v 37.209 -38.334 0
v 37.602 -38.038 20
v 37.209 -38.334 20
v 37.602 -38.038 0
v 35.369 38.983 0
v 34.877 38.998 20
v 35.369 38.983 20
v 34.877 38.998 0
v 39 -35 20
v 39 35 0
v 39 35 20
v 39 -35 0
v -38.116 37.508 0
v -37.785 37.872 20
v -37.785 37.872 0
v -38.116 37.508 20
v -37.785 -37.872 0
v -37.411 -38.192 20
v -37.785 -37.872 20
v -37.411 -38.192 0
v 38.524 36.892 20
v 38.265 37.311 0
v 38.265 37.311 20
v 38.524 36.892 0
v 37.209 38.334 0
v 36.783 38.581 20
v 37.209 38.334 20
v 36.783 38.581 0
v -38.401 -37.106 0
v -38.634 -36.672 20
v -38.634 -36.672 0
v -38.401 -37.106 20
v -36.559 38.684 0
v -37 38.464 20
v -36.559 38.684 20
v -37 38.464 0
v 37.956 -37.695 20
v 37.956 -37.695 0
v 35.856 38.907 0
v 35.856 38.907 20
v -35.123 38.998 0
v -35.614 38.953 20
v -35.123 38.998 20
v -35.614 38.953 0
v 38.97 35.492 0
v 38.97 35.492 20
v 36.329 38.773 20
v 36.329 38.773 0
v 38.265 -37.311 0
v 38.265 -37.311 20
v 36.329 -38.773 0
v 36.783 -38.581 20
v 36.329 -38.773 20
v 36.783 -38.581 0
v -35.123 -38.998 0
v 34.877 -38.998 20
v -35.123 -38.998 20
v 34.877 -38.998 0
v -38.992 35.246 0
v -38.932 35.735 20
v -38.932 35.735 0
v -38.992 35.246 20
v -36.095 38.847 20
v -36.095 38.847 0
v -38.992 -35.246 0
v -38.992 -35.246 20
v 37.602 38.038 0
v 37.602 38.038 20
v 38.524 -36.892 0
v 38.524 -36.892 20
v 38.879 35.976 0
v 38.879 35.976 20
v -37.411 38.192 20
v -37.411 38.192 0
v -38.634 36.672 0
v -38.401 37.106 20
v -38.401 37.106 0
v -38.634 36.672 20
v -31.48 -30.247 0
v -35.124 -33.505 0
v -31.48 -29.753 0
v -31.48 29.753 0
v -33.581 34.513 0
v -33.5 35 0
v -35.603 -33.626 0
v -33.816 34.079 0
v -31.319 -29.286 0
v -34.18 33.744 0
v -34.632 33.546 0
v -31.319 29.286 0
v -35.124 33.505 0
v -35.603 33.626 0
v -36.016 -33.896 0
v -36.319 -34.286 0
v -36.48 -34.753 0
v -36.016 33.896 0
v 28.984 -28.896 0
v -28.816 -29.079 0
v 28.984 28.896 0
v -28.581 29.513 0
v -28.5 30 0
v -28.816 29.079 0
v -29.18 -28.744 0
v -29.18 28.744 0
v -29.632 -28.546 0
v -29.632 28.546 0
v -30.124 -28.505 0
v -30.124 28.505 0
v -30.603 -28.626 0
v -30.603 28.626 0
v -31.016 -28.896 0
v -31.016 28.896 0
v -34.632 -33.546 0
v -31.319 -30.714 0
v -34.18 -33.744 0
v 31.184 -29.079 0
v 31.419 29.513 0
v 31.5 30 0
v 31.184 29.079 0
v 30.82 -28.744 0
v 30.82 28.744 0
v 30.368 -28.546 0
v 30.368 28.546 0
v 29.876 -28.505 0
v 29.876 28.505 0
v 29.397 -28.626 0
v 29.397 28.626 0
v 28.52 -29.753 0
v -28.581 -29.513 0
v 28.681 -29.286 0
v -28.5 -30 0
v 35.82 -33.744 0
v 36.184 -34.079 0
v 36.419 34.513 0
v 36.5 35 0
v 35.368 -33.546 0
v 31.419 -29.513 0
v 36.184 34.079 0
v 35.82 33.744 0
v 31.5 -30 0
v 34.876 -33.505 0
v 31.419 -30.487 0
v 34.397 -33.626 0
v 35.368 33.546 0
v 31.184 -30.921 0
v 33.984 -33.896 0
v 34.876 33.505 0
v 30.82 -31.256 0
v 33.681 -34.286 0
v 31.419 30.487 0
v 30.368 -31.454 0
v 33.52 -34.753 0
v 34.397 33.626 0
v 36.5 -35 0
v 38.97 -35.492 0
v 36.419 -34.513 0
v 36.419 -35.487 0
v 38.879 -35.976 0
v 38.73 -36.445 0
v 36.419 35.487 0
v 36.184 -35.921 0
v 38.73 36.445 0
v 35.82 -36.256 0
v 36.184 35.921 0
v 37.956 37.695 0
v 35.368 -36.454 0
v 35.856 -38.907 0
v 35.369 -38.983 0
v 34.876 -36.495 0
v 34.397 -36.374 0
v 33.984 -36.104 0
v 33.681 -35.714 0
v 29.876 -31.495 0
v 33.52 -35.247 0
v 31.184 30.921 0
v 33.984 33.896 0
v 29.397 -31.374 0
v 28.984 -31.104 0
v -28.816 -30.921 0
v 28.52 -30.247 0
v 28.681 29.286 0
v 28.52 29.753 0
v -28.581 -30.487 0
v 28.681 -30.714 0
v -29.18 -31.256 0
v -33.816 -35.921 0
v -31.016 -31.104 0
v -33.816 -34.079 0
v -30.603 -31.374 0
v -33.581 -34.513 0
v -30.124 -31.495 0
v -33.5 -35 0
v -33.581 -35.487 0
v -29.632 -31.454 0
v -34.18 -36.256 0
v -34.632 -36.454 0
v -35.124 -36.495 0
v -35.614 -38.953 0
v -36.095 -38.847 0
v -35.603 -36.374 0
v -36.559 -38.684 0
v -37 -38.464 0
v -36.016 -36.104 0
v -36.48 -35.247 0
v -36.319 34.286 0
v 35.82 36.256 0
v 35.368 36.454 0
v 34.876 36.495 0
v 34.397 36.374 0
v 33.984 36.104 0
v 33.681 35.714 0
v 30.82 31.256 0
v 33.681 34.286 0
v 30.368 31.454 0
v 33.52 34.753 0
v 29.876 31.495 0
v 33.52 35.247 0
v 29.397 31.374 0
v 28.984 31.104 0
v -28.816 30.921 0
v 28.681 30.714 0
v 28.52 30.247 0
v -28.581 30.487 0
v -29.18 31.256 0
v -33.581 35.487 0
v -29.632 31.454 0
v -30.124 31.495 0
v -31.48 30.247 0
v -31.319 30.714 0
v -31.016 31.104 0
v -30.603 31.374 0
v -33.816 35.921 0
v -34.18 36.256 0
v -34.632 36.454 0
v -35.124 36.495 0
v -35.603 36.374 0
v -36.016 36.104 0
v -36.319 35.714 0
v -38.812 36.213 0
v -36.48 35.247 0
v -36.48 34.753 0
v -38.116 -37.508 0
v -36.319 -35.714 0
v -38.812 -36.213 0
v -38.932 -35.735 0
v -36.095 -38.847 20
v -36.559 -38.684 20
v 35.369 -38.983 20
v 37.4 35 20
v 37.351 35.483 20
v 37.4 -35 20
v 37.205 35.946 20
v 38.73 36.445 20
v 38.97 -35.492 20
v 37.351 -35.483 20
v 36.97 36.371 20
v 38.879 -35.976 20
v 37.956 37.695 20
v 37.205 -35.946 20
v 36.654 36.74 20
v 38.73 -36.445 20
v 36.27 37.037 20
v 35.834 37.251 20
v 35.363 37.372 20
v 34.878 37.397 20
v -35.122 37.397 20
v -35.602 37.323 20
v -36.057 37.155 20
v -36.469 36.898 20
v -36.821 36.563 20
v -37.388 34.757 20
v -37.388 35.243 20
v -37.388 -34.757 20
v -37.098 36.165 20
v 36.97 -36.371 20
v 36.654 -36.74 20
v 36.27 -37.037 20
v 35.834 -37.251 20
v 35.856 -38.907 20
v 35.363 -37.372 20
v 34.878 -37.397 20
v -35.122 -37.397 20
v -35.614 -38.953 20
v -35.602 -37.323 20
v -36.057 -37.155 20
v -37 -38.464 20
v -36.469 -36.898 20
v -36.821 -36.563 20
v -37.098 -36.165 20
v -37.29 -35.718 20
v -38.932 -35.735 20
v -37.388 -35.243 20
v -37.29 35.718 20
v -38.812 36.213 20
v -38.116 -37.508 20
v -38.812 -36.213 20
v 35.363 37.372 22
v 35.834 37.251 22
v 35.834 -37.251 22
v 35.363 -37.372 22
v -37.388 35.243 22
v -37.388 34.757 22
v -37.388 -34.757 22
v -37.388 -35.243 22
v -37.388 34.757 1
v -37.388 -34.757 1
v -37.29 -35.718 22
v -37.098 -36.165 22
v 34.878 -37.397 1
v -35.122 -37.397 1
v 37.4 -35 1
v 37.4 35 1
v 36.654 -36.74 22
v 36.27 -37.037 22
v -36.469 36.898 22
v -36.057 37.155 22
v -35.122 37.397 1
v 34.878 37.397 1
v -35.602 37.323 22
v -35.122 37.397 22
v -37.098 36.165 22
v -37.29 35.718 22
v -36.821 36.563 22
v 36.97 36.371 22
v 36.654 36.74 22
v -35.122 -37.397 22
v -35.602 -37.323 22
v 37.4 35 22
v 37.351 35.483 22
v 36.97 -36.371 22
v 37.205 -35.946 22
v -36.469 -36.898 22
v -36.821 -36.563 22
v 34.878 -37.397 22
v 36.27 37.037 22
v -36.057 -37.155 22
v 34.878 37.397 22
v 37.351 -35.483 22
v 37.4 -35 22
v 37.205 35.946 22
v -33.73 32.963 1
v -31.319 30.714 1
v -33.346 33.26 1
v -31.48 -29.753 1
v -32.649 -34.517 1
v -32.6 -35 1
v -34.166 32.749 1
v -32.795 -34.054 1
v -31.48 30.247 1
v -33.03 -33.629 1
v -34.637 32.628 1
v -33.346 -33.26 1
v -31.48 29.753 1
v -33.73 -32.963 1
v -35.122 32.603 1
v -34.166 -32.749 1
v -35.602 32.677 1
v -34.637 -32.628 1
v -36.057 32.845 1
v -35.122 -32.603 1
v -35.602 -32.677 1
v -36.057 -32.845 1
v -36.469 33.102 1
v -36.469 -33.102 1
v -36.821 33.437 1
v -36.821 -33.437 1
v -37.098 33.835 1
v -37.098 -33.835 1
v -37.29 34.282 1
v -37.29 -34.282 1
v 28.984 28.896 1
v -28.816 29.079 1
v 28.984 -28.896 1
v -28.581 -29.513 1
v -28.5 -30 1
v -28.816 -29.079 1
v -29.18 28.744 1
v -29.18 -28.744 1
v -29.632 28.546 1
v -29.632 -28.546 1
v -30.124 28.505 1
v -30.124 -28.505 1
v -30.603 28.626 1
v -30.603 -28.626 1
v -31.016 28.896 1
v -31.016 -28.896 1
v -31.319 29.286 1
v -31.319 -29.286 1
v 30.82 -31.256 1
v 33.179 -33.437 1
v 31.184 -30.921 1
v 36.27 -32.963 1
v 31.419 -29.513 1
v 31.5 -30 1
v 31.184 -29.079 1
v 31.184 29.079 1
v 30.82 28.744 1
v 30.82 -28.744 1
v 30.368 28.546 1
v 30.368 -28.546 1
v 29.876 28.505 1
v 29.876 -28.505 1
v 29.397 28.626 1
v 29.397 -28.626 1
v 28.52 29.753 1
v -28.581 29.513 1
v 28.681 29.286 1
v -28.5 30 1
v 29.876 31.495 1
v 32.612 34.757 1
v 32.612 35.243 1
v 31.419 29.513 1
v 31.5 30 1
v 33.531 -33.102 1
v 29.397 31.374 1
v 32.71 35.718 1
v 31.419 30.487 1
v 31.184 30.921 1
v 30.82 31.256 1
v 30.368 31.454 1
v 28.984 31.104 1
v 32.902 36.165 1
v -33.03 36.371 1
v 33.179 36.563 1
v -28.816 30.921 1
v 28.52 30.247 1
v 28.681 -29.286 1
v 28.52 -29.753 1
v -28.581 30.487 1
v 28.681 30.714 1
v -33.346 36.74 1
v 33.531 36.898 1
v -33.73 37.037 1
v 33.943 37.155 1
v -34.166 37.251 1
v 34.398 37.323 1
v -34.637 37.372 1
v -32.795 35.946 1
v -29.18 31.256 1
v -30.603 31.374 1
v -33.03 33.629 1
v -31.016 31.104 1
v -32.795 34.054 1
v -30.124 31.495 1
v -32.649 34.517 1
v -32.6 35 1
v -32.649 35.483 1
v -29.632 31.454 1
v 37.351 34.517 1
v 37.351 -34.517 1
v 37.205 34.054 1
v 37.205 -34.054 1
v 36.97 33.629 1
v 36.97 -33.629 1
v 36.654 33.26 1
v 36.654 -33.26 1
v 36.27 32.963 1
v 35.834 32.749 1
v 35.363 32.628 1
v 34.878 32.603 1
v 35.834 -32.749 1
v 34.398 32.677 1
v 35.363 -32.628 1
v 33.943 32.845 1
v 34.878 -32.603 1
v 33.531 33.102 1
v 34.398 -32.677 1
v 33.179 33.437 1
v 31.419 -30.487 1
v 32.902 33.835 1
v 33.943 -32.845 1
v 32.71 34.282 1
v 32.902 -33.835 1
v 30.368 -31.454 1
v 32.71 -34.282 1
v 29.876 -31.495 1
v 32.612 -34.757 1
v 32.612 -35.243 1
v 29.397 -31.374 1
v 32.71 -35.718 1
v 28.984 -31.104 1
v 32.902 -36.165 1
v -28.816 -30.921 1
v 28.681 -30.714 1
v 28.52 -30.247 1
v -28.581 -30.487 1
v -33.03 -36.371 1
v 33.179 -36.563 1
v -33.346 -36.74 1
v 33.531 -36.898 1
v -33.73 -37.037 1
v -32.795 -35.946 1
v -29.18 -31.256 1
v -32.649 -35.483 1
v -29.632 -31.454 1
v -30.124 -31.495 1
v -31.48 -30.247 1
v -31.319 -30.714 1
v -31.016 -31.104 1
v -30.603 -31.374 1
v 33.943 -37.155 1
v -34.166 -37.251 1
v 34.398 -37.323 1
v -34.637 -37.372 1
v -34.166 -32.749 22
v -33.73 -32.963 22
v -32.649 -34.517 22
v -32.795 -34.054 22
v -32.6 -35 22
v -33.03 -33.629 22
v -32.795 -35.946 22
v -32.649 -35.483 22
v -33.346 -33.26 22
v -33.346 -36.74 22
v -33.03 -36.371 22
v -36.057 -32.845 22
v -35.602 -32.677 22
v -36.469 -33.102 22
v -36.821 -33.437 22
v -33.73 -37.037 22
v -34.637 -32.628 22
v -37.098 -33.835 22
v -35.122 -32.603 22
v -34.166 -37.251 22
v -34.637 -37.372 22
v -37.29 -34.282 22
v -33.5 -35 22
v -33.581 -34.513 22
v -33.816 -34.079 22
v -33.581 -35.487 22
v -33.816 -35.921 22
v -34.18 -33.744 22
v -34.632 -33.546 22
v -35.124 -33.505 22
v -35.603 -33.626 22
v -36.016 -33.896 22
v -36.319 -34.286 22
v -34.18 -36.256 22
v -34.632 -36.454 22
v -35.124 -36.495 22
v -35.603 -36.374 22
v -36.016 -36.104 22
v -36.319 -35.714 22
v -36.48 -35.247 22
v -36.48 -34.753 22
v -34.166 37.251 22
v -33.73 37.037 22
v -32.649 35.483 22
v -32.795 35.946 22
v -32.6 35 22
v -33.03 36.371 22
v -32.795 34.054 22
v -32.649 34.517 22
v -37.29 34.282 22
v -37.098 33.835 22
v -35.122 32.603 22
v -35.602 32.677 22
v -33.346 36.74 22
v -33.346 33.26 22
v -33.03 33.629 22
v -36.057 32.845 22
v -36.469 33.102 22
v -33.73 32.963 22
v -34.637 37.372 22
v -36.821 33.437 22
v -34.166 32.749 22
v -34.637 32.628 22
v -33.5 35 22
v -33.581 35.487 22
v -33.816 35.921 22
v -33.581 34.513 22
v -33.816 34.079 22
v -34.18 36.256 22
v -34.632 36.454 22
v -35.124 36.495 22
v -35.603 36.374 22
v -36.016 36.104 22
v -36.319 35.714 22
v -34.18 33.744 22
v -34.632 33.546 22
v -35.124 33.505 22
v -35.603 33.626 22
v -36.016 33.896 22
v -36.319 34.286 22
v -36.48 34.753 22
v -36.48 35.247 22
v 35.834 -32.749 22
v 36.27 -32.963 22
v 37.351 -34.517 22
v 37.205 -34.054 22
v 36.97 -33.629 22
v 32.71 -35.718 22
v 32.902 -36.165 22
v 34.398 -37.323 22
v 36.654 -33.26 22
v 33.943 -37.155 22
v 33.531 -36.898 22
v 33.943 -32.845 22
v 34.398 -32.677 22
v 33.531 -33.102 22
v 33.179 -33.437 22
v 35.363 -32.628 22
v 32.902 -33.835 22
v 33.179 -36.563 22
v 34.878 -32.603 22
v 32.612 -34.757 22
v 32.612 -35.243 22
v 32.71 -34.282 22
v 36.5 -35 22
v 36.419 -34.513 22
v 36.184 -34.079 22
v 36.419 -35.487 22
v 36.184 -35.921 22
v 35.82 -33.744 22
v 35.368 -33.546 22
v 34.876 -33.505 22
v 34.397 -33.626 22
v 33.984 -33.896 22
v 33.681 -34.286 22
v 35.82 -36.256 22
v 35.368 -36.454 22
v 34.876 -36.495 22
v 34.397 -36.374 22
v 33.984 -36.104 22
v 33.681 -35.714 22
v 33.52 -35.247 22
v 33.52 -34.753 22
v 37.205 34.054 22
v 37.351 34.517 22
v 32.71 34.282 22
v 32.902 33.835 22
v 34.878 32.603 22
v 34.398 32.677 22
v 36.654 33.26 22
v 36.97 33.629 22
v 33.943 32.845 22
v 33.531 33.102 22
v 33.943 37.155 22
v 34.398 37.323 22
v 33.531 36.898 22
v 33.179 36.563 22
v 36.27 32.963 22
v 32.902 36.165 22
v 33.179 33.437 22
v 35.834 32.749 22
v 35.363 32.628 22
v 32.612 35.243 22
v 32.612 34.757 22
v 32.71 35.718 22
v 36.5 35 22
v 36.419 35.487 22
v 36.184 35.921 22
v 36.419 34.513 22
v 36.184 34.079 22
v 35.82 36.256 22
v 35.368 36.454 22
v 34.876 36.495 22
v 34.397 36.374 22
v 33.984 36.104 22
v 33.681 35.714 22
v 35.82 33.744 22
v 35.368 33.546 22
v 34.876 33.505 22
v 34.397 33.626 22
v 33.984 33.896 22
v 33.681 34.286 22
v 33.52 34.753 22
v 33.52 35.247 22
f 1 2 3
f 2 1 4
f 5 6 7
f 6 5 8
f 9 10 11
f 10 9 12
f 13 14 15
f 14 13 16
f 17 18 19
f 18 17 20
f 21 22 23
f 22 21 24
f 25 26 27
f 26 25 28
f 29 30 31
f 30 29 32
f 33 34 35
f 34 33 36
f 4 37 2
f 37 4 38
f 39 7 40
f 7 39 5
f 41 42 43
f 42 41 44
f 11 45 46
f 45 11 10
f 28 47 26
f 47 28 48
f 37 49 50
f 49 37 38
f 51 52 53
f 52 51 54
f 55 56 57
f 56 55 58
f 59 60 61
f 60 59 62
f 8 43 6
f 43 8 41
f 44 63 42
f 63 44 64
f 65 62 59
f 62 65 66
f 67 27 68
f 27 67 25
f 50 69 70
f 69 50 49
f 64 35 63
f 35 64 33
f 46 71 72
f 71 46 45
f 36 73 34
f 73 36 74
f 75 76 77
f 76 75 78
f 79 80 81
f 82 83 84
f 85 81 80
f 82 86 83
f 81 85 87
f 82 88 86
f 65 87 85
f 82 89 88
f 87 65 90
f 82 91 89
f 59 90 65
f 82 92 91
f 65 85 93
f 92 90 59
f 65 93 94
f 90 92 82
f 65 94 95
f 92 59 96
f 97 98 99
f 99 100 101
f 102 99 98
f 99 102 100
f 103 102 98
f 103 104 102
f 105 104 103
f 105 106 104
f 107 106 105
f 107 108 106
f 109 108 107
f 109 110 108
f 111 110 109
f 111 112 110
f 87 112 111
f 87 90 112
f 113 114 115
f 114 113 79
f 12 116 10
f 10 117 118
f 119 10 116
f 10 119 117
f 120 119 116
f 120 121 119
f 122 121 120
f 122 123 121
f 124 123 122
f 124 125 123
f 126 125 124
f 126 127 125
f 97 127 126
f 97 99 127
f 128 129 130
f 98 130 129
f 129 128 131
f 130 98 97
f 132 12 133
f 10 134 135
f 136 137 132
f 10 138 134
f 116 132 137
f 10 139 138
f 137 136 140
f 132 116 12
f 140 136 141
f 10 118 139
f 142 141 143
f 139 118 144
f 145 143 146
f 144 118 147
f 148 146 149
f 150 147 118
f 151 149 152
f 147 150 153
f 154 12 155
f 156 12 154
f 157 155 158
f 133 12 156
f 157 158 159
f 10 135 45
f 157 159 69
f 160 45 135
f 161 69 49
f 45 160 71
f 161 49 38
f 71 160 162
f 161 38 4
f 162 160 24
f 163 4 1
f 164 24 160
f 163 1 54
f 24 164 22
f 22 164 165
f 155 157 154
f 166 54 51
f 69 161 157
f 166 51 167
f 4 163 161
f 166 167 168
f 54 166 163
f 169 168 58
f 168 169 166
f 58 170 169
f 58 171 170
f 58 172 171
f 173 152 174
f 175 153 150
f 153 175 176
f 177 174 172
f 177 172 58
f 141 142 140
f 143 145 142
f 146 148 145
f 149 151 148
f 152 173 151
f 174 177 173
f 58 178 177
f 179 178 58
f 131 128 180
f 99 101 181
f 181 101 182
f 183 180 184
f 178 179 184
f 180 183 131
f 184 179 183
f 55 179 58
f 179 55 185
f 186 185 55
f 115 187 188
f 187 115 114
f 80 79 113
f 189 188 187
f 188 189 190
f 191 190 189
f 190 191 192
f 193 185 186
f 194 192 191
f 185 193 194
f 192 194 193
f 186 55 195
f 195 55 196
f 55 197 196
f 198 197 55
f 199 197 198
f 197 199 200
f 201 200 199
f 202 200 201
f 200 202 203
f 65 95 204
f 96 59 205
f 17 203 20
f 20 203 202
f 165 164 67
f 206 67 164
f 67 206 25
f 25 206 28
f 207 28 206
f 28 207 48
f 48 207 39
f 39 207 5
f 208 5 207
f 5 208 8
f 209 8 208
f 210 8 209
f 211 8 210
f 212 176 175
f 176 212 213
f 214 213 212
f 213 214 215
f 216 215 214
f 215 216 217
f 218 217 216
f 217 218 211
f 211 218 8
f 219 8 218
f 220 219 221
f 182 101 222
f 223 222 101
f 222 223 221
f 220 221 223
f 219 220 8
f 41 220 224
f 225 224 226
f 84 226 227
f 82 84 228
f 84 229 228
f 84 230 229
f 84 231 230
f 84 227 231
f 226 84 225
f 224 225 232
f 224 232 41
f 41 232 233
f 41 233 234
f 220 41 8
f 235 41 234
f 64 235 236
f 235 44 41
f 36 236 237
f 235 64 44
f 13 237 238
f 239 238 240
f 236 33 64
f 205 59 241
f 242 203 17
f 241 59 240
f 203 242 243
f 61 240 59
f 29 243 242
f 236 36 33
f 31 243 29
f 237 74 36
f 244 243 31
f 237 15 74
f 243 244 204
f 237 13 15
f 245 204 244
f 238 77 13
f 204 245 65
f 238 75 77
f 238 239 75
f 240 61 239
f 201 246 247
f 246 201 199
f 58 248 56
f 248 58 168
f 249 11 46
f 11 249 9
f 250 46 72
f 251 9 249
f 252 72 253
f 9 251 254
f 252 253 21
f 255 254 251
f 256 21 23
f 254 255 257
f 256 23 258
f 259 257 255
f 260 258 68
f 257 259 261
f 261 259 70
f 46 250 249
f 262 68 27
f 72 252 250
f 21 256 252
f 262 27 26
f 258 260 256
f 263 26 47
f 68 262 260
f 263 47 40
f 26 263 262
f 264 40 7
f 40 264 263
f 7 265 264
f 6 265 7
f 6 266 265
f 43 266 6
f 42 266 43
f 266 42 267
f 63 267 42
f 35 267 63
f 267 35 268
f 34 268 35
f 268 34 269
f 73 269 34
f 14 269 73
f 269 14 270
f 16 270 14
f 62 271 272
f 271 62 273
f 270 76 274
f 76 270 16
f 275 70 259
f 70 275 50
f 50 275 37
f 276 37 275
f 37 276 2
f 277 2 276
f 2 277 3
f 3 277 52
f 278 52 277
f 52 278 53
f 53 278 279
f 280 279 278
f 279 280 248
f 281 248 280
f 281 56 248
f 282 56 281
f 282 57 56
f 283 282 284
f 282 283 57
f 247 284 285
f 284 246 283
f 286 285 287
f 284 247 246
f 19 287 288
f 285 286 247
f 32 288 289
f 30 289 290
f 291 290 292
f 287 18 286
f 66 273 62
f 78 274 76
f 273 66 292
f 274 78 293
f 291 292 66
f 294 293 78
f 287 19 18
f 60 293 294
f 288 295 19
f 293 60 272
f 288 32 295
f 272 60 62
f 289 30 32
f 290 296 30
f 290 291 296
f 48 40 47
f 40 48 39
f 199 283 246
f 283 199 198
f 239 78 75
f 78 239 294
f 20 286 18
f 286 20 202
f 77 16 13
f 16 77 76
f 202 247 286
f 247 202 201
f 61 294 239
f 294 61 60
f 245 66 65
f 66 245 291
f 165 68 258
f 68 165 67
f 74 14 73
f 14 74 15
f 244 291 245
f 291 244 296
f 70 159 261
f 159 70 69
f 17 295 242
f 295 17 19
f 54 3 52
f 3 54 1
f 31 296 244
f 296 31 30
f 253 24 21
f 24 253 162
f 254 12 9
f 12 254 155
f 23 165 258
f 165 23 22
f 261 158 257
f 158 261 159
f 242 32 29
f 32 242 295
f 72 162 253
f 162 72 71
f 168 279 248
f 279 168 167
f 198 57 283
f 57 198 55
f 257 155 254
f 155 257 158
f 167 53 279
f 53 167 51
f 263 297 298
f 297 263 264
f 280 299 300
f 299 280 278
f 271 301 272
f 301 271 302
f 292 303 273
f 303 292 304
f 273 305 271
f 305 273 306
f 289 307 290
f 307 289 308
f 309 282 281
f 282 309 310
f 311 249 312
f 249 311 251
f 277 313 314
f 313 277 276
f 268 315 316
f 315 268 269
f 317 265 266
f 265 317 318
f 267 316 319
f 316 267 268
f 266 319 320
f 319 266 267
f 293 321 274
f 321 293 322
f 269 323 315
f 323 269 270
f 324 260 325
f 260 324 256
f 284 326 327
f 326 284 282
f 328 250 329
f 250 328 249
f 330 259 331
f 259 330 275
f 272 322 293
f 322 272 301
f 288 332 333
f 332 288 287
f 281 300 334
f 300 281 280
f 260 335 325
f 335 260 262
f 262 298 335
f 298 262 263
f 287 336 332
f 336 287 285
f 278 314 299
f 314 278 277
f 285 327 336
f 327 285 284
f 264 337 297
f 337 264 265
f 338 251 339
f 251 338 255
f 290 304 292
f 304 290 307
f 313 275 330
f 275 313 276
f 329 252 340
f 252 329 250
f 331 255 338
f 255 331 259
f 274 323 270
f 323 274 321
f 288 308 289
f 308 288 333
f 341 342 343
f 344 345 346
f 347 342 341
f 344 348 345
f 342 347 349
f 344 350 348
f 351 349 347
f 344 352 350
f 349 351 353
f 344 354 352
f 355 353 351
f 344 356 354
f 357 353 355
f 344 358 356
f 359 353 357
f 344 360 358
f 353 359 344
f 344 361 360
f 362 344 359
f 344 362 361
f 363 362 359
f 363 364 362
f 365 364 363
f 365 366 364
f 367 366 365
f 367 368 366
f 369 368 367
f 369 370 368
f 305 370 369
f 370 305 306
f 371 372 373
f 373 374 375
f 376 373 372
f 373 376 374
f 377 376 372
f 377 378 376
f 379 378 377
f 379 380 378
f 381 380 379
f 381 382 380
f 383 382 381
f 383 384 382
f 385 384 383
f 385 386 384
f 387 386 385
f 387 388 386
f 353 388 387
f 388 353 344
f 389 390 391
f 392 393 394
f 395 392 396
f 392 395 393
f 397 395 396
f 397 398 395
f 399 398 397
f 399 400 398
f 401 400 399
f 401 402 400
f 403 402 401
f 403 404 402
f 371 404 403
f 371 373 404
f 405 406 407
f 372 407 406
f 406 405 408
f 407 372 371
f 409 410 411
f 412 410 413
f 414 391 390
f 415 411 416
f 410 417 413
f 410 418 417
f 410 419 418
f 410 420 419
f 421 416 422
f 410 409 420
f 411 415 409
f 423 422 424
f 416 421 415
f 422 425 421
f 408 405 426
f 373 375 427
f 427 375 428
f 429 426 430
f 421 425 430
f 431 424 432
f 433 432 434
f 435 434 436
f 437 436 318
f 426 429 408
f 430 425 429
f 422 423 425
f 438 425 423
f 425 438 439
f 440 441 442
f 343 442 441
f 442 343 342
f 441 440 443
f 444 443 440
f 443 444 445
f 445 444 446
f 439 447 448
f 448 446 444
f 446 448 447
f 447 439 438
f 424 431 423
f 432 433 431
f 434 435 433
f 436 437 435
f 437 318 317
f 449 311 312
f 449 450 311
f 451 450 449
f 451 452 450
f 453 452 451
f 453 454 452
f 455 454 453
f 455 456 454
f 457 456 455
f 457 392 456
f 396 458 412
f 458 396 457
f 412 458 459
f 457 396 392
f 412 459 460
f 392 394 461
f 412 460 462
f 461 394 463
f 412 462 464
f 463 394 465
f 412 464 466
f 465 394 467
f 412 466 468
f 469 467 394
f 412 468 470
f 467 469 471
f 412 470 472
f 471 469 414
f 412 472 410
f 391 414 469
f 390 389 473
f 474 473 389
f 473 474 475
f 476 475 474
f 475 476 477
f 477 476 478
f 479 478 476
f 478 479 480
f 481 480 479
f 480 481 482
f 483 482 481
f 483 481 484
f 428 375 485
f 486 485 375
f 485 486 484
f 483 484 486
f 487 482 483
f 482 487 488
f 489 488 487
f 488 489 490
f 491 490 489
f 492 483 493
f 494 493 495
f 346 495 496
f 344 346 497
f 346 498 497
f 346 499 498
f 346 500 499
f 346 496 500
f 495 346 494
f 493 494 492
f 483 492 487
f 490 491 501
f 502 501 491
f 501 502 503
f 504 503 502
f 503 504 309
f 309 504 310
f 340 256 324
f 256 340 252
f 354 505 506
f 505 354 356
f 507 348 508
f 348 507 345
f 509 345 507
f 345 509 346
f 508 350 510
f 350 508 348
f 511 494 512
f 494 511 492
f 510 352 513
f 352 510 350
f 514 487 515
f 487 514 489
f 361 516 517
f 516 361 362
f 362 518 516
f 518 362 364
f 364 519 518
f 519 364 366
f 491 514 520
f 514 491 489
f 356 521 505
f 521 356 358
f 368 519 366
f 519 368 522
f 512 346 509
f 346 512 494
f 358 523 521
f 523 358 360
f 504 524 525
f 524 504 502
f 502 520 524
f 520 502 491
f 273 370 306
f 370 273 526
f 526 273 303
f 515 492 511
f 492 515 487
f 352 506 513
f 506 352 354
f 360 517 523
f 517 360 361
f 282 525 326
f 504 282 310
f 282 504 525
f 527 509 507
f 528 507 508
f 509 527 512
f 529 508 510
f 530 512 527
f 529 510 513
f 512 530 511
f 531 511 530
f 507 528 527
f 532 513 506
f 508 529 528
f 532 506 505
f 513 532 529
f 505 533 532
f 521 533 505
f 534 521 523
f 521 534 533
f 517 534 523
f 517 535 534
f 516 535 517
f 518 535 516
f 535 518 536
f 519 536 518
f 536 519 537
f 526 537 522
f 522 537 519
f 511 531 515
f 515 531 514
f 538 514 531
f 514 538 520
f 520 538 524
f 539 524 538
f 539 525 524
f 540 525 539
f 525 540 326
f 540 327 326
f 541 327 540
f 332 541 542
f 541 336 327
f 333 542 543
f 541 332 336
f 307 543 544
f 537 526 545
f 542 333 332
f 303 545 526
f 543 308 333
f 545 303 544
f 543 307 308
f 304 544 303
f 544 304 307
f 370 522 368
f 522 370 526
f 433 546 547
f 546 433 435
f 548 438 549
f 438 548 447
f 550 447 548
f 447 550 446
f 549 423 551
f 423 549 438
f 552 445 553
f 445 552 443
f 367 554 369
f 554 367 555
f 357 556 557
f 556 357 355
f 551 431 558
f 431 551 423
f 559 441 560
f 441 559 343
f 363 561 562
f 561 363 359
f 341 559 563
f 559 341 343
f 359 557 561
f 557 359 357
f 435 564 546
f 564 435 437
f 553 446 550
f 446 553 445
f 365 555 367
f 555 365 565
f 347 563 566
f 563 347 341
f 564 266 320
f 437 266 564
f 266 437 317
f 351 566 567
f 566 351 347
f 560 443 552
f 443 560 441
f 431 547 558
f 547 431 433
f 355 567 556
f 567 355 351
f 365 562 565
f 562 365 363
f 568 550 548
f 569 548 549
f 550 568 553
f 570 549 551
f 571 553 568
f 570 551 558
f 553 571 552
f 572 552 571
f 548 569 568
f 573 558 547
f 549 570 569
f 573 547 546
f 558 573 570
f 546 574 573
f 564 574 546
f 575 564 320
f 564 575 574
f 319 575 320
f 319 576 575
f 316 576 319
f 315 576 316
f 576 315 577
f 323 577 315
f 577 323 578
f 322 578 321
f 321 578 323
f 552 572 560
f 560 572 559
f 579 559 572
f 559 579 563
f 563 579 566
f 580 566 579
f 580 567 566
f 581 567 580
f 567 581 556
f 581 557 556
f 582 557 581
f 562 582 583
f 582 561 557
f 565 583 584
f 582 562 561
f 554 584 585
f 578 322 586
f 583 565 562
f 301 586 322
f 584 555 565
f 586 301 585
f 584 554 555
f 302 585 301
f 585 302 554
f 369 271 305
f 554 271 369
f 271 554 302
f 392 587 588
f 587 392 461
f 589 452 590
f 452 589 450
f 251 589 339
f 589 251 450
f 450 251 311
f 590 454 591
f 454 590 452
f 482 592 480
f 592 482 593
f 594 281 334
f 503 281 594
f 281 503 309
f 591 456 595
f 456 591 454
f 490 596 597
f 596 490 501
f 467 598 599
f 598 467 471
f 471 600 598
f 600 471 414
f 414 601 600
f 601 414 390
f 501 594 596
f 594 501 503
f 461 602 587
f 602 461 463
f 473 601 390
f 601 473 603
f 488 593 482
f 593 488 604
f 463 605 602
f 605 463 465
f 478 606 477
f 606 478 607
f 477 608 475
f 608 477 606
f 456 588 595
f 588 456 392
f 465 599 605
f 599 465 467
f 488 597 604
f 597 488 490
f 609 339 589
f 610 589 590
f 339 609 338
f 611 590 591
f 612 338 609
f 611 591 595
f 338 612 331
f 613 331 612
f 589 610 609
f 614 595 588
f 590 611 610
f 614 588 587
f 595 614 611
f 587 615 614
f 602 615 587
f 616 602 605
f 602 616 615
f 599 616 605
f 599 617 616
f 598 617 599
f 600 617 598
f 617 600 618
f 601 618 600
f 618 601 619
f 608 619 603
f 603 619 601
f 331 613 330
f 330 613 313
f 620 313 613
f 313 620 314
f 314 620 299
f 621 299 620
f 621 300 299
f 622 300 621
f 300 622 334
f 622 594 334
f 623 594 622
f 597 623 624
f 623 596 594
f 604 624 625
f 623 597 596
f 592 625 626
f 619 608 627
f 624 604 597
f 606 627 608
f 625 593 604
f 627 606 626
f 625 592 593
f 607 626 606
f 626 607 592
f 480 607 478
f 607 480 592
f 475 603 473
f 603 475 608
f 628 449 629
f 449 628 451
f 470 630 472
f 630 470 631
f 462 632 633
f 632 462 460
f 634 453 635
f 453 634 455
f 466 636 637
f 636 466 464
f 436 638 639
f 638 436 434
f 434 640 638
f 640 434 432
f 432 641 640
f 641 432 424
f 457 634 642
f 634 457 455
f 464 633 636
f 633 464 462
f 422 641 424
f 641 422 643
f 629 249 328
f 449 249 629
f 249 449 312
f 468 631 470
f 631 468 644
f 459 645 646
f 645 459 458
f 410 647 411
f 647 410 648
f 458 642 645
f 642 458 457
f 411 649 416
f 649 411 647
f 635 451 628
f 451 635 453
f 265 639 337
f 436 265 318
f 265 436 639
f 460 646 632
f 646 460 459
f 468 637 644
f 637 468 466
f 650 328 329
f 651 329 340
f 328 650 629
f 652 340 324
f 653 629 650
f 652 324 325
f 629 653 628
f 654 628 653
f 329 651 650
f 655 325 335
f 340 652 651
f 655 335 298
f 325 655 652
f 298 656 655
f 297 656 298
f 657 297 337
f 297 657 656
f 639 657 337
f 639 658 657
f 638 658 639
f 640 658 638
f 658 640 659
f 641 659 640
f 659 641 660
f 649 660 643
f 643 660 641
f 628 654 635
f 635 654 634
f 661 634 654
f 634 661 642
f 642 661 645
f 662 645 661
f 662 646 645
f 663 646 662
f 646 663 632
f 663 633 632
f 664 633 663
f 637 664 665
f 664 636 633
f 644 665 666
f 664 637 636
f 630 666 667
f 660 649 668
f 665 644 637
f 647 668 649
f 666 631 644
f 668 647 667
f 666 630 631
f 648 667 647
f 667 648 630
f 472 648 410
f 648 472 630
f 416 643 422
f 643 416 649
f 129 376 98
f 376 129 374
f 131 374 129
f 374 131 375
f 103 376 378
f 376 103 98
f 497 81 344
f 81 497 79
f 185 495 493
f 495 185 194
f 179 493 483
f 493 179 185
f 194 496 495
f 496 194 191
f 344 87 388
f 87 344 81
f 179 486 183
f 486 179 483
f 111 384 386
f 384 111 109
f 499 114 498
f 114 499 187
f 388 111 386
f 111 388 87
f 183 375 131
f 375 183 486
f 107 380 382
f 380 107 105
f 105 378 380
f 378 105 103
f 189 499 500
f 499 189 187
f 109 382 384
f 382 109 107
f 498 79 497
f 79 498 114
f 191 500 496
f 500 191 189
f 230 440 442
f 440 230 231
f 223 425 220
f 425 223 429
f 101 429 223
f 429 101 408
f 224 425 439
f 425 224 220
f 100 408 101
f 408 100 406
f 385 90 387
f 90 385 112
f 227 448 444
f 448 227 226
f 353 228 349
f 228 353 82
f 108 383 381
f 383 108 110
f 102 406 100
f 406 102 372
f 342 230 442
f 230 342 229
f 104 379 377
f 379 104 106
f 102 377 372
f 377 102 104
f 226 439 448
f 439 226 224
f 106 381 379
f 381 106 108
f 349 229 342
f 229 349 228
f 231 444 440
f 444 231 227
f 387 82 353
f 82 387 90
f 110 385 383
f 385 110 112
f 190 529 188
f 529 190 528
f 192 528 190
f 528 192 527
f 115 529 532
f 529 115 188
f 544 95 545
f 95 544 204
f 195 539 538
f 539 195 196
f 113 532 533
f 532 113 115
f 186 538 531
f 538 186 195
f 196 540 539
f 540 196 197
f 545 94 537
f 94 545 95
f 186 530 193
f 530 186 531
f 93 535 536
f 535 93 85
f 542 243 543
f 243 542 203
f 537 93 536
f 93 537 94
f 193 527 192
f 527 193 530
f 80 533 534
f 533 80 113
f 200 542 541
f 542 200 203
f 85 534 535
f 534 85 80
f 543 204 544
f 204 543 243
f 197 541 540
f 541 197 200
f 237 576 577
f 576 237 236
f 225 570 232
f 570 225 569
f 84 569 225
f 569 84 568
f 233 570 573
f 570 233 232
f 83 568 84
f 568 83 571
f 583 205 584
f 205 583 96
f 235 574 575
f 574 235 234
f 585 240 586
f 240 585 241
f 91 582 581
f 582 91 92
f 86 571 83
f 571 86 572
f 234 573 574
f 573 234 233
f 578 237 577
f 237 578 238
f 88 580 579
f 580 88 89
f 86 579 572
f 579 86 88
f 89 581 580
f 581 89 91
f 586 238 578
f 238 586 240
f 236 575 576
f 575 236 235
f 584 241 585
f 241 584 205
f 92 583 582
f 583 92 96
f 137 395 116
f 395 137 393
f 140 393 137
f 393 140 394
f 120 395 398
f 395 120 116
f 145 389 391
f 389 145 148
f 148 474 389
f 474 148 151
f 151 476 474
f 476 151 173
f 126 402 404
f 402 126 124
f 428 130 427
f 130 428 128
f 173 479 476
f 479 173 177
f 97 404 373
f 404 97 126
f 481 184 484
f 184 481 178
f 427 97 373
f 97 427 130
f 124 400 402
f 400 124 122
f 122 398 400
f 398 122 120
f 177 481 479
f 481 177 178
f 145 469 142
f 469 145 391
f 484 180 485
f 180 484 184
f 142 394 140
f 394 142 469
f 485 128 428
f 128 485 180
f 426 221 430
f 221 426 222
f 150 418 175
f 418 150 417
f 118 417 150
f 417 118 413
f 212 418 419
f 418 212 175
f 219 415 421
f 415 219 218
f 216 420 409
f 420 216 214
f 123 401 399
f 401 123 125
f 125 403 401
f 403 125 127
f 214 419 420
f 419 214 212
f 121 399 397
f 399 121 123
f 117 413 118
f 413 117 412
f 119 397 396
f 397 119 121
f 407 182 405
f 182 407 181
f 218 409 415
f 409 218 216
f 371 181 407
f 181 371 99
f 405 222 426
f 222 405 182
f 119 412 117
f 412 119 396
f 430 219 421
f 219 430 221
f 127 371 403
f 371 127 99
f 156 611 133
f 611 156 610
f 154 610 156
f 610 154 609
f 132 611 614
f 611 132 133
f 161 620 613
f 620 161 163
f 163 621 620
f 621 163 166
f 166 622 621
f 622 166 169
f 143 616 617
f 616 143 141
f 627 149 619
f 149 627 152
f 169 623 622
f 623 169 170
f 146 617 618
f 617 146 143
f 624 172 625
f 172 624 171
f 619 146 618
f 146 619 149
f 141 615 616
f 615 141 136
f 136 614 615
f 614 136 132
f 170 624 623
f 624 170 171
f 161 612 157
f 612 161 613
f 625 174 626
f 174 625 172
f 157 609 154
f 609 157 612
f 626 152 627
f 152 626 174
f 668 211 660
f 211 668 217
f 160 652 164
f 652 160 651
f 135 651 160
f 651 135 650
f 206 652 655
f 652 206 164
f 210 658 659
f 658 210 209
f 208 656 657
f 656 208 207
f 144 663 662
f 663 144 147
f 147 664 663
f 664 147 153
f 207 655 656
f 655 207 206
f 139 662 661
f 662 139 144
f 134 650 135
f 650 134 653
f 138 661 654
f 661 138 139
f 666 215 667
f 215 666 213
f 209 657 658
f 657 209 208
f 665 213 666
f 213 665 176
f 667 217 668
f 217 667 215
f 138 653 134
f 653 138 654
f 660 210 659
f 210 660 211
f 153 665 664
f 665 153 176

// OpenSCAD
$fs=$fs/4;
$fa=$fa/4;

boitier_l = 70;
boitier_lg = 70;
h=15;

module cube_arrondi(l,lg,h,r){
    hull(){
        for(i=[-1,1]){
            for(j=[-1,1]){
                translate([i*l/2, j*lg/2]) cylinder(r=r,h);
            }
        }
    }
}

module down(h){

    difference(){
        union(){
            difference(){
                cube_arrondi(boitier_l, boitier_l, h,4);
                
                translate([0,0,1]) cube_arrondi(boitier_l, boitier_l, h,2.5);
            } 

            for(i=[-1,1]){
                for(j=[-1,1]){
                    translate([i*30, j*30]) cylinder(r=4,3);
                }
            }
        }
        for(i=[-1,1]){
            for(j=[-1,1]){
                translate([i*30, j*30,-1]) cylinder(r=1.5,10);
            }
            for(j=[-1,1]){
                translate([i*35, j*35,-1]) cylinder(r=1.5,10);
            }
        }
        translate([0, -20, 3]) cube([boitier_l,4,h]);
        for(i=[-1:1]){
            translate([-2+20*i, 0, 3]) cube([4,boitier_l,h]);
        }
    }
}

module up(h){

    difference(){
        union(){
            difference(){
                cube_arrondi(boitier_l, boitier_l, h,4);
                
                translate([0,0,1]) cube_arrondi(boitier_l, boitier_l, h,2.4);
            } 

            for(i=[-1,1]){
                for(j=[-1,1]){
                    translate([i*35, j*35]) cylinder(r=2.4,h+2);
                }
            }
        }
        for(i=[-1,1]){
            for(j=[-1,1]){
                translate([i*30, j*30,-1]) cylinder(r=1.5,h+4);
            }
            for(j=[-1,1]){
                translate([i*35, j*35,-1]) cylinder(r=1.5,h+4);
            }
        }
    }
}

mode=1;
if(mode == 1){
    up(20);
} else {
    down(10);
} 
